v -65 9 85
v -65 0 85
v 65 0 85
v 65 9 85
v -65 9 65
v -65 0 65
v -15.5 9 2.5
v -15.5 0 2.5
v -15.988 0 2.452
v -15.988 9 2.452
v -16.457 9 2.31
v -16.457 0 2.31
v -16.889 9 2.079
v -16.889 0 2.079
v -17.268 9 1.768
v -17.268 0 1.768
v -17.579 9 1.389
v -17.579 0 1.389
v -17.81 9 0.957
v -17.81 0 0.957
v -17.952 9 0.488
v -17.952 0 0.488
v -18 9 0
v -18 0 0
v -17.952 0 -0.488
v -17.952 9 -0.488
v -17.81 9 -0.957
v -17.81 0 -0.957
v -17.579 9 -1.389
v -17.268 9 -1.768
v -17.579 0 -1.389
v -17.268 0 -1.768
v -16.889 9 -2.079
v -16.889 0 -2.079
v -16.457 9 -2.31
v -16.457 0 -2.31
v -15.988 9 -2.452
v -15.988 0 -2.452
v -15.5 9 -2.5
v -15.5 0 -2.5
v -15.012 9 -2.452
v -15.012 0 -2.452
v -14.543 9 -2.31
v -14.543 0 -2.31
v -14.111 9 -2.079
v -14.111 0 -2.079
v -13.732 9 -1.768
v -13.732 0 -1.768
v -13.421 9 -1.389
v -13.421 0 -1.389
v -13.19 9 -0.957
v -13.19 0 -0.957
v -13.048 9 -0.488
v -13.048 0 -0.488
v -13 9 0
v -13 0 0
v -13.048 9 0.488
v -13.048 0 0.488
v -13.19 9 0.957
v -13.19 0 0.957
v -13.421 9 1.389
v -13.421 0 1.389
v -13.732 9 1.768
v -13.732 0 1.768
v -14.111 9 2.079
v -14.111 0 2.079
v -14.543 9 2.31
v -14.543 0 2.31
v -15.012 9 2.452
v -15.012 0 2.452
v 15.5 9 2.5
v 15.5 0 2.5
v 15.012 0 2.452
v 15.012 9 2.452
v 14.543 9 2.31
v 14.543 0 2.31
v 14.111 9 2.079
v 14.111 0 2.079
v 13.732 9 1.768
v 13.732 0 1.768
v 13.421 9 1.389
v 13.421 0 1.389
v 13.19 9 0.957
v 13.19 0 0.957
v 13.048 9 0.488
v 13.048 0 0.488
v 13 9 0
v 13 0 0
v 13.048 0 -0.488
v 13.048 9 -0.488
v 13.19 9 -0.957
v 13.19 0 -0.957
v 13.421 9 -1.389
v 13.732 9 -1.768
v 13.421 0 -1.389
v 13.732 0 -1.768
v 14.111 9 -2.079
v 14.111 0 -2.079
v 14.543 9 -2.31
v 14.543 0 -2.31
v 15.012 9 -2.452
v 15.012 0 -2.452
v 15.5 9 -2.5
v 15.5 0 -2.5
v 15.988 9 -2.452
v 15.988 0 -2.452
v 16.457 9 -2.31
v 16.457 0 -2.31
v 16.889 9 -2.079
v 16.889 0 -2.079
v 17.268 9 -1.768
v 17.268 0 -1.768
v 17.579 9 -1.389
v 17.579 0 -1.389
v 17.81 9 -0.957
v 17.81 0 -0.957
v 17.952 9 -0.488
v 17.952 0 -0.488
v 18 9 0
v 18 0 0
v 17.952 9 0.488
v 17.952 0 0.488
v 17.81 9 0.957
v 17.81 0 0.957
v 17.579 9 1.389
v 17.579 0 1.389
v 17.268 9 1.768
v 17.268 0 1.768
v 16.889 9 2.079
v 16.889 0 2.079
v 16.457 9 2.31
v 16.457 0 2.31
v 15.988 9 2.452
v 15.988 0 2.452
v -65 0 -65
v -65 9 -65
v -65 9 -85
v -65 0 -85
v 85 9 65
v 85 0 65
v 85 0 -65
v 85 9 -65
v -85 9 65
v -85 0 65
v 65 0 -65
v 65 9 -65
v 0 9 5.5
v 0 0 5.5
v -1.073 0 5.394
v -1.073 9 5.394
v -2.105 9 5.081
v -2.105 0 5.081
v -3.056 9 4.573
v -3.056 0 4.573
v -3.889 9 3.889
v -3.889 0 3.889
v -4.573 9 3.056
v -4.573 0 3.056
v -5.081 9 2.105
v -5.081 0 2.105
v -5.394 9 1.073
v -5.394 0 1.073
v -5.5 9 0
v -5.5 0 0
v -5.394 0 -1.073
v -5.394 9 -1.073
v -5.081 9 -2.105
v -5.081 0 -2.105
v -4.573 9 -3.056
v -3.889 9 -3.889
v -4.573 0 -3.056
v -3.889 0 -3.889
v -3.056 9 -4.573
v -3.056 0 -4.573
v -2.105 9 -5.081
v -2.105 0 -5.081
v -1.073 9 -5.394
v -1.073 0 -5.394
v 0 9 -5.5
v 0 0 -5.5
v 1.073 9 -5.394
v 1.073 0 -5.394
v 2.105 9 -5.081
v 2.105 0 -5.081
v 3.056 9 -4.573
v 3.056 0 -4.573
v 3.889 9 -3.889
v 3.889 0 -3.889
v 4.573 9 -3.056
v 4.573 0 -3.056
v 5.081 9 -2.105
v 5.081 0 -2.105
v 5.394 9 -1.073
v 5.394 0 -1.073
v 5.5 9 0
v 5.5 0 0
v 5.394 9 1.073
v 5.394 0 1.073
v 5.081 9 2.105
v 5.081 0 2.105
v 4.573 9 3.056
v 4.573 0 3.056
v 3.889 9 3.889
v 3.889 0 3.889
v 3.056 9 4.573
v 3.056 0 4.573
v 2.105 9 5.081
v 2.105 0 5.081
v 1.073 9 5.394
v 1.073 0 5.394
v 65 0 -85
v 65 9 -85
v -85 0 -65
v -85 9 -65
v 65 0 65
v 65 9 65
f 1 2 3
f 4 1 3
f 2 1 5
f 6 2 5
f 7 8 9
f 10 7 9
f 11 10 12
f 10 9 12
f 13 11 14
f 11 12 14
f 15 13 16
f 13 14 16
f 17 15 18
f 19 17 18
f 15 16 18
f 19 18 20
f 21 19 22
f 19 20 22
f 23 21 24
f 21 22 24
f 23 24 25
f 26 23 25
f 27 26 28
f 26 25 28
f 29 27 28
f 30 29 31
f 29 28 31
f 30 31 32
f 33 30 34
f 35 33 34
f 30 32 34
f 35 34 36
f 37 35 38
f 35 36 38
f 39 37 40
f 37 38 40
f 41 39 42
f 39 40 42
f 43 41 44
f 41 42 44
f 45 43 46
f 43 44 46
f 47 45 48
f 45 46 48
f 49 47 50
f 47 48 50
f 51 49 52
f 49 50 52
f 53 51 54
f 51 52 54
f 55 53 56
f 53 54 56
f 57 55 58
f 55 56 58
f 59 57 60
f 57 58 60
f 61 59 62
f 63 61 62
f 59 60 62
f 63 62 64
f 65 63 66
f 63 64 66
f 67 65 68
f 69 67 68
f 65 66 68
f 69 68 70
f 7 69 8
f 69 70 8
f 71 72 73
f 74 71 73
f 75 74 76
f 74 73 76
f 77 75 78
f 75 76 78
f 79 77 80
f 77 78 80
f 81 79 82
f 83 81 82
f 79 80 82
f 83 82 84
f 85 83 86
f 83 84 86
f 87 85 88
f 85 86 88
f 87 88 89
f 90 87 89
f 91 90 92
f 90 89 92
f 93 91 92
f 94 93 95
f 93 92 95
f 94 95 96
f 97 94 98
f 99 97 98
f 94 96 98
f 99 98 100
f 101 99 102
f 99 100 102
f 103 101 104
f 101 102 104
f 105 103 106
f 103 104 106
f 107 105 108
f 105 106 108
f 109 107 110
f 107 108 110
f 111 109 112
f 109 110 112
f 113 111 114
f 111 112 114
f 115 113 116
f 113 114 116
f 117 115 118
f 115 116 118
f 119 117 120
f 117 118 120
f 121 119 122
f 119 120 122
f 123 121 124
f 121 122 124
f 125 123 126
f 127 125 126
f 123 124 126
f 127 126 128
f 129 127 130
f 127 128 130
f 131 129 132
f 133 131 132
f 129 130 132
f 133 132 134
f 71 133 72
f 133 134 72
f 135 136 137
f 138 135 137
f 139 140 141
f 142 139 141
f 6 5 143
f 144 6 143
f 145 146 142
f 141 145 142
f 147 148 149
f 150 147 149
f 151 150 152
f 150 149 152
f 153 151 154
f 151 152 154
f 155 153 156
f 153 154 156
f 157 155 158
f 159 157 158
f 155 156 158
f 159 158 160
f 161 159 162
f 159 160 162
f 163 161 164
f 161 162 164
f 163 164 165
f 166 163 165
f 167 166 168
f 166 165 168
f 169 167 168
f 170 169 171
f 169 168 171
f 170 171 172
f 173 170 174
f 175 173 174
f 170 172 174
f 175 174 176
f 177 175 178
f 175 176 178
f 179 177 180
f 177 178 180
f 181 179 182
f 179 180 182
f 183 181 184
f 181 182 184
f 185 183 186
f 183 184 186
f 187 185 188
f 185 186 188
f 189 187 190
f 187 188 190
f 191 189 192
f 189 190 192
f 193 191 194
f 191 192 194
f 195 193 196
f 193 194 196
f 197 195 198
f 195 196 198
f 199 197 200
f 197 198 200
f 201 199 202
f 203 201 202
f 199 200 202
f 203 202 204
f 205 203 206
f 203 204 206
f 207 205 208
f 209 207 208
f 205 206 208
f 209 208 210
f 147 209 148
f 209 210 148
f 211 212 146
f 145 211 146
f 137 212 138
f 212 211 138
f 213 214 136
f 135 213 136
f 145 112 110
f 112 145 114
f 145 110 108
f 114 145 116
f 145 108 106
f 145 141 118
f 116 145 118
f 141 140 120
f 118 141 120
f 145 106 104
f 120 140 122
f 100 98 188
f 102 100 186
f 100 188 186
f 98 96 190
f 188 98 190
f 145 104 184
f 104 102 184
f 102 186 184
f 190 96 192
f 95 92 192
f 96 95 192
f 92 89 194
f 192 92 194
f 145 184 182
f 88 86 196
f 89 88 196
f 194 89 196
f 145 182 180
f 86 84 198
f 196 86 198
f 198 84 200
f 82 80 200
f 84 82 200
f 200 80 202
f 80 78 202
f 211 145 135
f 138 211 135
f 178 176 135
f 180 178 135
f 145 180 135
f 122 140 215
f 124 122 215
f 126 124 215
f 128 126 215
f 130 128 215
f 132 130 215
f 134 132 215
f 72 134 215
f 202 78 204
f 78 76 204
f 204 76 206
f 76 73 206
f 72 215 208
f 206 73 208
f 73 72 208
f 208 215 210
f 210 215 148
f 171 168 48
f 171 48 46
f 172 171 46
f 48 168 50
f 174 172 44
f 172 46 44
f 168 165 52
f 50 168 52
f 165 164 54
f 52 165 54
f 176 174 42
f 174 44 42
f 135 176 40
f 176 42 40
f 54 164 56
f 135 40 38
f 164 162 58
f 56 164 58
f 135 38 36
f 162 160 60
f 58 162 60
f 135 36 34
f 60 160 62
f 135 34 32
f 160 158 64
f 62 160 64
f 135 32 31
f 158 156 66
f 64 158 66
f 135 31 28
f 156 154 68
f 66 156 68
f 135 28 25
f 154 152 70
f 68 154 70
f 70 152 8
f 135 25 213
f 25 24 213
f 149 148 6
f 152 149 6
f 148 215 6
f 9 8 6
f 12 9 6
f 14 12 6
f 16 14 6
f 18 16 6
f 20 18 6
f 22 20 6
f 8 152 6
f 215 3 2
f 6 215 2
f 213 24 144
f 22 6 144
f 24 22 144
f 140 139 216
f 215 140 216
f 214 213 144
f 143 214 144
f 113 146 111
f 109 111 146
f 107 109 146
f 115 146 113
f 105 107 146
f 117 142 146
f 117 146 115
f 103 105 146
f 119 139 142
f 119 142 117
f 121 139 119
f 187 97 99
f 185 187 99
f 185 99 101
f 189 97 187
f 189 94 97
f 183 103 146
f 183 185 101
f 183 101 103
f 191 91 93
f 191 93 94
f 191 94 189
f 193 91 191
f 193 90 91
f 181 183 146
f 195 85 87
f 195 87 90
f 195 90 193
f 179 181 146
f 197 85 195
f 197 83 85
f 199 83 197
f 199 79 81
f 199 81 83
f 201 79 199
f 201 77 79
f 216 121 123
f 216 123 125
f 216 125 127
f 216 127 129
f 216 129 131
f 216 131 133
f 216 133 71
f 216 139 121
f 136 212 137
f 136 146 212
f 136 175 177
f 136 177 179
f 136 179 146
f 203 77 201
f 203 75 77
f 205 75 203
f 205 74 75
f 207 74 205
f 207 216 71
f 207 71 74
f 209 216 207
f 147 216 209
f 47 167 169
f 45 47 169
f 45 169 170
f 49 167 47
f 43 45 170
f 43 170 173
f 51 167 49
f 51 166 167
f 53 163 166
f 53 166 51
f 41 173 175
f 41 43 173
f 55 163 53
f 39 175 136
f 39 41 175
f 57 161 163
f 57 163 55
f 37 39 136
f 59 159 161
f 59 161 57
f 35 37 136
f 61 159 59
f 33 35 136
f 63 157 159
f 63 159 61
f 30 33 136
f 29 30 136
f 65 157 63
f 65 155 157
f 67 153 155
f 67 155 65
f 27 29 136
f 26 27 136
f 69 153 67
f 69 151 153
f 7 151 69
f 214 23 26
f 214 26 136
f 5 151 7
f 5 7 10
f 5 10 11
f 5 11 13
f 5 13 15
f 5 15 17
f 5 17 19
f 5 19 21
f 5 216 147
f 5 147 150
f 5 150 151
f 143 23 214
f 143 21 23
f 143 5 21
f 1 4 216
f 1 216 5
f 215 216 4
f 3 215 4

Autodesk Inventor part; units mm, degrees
ref_plane "YZ Plane" through (0, 0, 0) normal (1, 0, 0) x (0, 1, 0)
ref_plane "XZ Plane" through (0, 0, 0) normal (0, 1, 0) x (-1, 0, 0)
ref_plane "XY Plane" through (0, 0, 0) normal (0, 0, 1) x (1, 0, 0)
sketch "草圖1" plane through (0, 0, 0) normal (0, 1, 0) x (-1, 0, 0)
  line L0 (85, 85) -> (-85, 85)
  line L1 (-85, 85) -> (-85, -85)
  line L2 (-85, -85) -> (85, -85)
  line L3 (85, -85) -> (85, 85)
  line L4 (85, 85) -> (-85, -85) construction
  line L5 (-85, 85) -> (85, -85) construction
  point P0 (0, 0)
  dimension "d0" = 170
  dimension "d1" = 170
extrude "擠出1" add sketch "草圖1" along normal blind 9
sketch "草圖2" plane through (0, 9, 0) normal (0, 1, 0) x (1, 0, 0)
  line L0 (-85, 85) -> (-85, -85) projected
  line L1 (-85, -85) -> (-65, -85)
  line L2 (-65, -85) -> (-65, -65)
  line L3 (-65, -65) -> (-85, -65)
  line L4 (-85, -65) -> (-85, -85)
  point P0 (0, 0)
  dimension "d4" = 20
  dimension "d5" = 20
extrude "擠出2" cut sketch "草圖2" against normal through all
pattern_circular "環形陣列1" count 4 over 360 about axis through (0, -10, 0) along (0, 1, 0) of "擠出2"
sketch "草圖5" plane through (0, 9, 0) normal (0, 1, 0) x (1, 0, 0)
  point P0 (0, 0)
  point P1 (0, 0)
hole "孔3" at (0, 9, 0) direction (0, -1, 0) diameter 11 end through all
sketch "草圖6" plane through (0, 9, 0) normal (0, 1, 0) x (1, 0, 0)
  point P0 (0, 0)
  point P1 (-15.5, 0)
  point P2 (15.5, 0)
  dimension "d36" = 31
  dimension "d37" = 15.5
hole "孔4" at (-15.5, 9, 0) at (15.5, 9, 0) direction (0, -1, 0) diameter 5 end through all
equation "\"d0\" = d1"
equation "\"d37\" = 0.5 * d36"
properties part number "上部3分木板中板" material "松木、赤松"
